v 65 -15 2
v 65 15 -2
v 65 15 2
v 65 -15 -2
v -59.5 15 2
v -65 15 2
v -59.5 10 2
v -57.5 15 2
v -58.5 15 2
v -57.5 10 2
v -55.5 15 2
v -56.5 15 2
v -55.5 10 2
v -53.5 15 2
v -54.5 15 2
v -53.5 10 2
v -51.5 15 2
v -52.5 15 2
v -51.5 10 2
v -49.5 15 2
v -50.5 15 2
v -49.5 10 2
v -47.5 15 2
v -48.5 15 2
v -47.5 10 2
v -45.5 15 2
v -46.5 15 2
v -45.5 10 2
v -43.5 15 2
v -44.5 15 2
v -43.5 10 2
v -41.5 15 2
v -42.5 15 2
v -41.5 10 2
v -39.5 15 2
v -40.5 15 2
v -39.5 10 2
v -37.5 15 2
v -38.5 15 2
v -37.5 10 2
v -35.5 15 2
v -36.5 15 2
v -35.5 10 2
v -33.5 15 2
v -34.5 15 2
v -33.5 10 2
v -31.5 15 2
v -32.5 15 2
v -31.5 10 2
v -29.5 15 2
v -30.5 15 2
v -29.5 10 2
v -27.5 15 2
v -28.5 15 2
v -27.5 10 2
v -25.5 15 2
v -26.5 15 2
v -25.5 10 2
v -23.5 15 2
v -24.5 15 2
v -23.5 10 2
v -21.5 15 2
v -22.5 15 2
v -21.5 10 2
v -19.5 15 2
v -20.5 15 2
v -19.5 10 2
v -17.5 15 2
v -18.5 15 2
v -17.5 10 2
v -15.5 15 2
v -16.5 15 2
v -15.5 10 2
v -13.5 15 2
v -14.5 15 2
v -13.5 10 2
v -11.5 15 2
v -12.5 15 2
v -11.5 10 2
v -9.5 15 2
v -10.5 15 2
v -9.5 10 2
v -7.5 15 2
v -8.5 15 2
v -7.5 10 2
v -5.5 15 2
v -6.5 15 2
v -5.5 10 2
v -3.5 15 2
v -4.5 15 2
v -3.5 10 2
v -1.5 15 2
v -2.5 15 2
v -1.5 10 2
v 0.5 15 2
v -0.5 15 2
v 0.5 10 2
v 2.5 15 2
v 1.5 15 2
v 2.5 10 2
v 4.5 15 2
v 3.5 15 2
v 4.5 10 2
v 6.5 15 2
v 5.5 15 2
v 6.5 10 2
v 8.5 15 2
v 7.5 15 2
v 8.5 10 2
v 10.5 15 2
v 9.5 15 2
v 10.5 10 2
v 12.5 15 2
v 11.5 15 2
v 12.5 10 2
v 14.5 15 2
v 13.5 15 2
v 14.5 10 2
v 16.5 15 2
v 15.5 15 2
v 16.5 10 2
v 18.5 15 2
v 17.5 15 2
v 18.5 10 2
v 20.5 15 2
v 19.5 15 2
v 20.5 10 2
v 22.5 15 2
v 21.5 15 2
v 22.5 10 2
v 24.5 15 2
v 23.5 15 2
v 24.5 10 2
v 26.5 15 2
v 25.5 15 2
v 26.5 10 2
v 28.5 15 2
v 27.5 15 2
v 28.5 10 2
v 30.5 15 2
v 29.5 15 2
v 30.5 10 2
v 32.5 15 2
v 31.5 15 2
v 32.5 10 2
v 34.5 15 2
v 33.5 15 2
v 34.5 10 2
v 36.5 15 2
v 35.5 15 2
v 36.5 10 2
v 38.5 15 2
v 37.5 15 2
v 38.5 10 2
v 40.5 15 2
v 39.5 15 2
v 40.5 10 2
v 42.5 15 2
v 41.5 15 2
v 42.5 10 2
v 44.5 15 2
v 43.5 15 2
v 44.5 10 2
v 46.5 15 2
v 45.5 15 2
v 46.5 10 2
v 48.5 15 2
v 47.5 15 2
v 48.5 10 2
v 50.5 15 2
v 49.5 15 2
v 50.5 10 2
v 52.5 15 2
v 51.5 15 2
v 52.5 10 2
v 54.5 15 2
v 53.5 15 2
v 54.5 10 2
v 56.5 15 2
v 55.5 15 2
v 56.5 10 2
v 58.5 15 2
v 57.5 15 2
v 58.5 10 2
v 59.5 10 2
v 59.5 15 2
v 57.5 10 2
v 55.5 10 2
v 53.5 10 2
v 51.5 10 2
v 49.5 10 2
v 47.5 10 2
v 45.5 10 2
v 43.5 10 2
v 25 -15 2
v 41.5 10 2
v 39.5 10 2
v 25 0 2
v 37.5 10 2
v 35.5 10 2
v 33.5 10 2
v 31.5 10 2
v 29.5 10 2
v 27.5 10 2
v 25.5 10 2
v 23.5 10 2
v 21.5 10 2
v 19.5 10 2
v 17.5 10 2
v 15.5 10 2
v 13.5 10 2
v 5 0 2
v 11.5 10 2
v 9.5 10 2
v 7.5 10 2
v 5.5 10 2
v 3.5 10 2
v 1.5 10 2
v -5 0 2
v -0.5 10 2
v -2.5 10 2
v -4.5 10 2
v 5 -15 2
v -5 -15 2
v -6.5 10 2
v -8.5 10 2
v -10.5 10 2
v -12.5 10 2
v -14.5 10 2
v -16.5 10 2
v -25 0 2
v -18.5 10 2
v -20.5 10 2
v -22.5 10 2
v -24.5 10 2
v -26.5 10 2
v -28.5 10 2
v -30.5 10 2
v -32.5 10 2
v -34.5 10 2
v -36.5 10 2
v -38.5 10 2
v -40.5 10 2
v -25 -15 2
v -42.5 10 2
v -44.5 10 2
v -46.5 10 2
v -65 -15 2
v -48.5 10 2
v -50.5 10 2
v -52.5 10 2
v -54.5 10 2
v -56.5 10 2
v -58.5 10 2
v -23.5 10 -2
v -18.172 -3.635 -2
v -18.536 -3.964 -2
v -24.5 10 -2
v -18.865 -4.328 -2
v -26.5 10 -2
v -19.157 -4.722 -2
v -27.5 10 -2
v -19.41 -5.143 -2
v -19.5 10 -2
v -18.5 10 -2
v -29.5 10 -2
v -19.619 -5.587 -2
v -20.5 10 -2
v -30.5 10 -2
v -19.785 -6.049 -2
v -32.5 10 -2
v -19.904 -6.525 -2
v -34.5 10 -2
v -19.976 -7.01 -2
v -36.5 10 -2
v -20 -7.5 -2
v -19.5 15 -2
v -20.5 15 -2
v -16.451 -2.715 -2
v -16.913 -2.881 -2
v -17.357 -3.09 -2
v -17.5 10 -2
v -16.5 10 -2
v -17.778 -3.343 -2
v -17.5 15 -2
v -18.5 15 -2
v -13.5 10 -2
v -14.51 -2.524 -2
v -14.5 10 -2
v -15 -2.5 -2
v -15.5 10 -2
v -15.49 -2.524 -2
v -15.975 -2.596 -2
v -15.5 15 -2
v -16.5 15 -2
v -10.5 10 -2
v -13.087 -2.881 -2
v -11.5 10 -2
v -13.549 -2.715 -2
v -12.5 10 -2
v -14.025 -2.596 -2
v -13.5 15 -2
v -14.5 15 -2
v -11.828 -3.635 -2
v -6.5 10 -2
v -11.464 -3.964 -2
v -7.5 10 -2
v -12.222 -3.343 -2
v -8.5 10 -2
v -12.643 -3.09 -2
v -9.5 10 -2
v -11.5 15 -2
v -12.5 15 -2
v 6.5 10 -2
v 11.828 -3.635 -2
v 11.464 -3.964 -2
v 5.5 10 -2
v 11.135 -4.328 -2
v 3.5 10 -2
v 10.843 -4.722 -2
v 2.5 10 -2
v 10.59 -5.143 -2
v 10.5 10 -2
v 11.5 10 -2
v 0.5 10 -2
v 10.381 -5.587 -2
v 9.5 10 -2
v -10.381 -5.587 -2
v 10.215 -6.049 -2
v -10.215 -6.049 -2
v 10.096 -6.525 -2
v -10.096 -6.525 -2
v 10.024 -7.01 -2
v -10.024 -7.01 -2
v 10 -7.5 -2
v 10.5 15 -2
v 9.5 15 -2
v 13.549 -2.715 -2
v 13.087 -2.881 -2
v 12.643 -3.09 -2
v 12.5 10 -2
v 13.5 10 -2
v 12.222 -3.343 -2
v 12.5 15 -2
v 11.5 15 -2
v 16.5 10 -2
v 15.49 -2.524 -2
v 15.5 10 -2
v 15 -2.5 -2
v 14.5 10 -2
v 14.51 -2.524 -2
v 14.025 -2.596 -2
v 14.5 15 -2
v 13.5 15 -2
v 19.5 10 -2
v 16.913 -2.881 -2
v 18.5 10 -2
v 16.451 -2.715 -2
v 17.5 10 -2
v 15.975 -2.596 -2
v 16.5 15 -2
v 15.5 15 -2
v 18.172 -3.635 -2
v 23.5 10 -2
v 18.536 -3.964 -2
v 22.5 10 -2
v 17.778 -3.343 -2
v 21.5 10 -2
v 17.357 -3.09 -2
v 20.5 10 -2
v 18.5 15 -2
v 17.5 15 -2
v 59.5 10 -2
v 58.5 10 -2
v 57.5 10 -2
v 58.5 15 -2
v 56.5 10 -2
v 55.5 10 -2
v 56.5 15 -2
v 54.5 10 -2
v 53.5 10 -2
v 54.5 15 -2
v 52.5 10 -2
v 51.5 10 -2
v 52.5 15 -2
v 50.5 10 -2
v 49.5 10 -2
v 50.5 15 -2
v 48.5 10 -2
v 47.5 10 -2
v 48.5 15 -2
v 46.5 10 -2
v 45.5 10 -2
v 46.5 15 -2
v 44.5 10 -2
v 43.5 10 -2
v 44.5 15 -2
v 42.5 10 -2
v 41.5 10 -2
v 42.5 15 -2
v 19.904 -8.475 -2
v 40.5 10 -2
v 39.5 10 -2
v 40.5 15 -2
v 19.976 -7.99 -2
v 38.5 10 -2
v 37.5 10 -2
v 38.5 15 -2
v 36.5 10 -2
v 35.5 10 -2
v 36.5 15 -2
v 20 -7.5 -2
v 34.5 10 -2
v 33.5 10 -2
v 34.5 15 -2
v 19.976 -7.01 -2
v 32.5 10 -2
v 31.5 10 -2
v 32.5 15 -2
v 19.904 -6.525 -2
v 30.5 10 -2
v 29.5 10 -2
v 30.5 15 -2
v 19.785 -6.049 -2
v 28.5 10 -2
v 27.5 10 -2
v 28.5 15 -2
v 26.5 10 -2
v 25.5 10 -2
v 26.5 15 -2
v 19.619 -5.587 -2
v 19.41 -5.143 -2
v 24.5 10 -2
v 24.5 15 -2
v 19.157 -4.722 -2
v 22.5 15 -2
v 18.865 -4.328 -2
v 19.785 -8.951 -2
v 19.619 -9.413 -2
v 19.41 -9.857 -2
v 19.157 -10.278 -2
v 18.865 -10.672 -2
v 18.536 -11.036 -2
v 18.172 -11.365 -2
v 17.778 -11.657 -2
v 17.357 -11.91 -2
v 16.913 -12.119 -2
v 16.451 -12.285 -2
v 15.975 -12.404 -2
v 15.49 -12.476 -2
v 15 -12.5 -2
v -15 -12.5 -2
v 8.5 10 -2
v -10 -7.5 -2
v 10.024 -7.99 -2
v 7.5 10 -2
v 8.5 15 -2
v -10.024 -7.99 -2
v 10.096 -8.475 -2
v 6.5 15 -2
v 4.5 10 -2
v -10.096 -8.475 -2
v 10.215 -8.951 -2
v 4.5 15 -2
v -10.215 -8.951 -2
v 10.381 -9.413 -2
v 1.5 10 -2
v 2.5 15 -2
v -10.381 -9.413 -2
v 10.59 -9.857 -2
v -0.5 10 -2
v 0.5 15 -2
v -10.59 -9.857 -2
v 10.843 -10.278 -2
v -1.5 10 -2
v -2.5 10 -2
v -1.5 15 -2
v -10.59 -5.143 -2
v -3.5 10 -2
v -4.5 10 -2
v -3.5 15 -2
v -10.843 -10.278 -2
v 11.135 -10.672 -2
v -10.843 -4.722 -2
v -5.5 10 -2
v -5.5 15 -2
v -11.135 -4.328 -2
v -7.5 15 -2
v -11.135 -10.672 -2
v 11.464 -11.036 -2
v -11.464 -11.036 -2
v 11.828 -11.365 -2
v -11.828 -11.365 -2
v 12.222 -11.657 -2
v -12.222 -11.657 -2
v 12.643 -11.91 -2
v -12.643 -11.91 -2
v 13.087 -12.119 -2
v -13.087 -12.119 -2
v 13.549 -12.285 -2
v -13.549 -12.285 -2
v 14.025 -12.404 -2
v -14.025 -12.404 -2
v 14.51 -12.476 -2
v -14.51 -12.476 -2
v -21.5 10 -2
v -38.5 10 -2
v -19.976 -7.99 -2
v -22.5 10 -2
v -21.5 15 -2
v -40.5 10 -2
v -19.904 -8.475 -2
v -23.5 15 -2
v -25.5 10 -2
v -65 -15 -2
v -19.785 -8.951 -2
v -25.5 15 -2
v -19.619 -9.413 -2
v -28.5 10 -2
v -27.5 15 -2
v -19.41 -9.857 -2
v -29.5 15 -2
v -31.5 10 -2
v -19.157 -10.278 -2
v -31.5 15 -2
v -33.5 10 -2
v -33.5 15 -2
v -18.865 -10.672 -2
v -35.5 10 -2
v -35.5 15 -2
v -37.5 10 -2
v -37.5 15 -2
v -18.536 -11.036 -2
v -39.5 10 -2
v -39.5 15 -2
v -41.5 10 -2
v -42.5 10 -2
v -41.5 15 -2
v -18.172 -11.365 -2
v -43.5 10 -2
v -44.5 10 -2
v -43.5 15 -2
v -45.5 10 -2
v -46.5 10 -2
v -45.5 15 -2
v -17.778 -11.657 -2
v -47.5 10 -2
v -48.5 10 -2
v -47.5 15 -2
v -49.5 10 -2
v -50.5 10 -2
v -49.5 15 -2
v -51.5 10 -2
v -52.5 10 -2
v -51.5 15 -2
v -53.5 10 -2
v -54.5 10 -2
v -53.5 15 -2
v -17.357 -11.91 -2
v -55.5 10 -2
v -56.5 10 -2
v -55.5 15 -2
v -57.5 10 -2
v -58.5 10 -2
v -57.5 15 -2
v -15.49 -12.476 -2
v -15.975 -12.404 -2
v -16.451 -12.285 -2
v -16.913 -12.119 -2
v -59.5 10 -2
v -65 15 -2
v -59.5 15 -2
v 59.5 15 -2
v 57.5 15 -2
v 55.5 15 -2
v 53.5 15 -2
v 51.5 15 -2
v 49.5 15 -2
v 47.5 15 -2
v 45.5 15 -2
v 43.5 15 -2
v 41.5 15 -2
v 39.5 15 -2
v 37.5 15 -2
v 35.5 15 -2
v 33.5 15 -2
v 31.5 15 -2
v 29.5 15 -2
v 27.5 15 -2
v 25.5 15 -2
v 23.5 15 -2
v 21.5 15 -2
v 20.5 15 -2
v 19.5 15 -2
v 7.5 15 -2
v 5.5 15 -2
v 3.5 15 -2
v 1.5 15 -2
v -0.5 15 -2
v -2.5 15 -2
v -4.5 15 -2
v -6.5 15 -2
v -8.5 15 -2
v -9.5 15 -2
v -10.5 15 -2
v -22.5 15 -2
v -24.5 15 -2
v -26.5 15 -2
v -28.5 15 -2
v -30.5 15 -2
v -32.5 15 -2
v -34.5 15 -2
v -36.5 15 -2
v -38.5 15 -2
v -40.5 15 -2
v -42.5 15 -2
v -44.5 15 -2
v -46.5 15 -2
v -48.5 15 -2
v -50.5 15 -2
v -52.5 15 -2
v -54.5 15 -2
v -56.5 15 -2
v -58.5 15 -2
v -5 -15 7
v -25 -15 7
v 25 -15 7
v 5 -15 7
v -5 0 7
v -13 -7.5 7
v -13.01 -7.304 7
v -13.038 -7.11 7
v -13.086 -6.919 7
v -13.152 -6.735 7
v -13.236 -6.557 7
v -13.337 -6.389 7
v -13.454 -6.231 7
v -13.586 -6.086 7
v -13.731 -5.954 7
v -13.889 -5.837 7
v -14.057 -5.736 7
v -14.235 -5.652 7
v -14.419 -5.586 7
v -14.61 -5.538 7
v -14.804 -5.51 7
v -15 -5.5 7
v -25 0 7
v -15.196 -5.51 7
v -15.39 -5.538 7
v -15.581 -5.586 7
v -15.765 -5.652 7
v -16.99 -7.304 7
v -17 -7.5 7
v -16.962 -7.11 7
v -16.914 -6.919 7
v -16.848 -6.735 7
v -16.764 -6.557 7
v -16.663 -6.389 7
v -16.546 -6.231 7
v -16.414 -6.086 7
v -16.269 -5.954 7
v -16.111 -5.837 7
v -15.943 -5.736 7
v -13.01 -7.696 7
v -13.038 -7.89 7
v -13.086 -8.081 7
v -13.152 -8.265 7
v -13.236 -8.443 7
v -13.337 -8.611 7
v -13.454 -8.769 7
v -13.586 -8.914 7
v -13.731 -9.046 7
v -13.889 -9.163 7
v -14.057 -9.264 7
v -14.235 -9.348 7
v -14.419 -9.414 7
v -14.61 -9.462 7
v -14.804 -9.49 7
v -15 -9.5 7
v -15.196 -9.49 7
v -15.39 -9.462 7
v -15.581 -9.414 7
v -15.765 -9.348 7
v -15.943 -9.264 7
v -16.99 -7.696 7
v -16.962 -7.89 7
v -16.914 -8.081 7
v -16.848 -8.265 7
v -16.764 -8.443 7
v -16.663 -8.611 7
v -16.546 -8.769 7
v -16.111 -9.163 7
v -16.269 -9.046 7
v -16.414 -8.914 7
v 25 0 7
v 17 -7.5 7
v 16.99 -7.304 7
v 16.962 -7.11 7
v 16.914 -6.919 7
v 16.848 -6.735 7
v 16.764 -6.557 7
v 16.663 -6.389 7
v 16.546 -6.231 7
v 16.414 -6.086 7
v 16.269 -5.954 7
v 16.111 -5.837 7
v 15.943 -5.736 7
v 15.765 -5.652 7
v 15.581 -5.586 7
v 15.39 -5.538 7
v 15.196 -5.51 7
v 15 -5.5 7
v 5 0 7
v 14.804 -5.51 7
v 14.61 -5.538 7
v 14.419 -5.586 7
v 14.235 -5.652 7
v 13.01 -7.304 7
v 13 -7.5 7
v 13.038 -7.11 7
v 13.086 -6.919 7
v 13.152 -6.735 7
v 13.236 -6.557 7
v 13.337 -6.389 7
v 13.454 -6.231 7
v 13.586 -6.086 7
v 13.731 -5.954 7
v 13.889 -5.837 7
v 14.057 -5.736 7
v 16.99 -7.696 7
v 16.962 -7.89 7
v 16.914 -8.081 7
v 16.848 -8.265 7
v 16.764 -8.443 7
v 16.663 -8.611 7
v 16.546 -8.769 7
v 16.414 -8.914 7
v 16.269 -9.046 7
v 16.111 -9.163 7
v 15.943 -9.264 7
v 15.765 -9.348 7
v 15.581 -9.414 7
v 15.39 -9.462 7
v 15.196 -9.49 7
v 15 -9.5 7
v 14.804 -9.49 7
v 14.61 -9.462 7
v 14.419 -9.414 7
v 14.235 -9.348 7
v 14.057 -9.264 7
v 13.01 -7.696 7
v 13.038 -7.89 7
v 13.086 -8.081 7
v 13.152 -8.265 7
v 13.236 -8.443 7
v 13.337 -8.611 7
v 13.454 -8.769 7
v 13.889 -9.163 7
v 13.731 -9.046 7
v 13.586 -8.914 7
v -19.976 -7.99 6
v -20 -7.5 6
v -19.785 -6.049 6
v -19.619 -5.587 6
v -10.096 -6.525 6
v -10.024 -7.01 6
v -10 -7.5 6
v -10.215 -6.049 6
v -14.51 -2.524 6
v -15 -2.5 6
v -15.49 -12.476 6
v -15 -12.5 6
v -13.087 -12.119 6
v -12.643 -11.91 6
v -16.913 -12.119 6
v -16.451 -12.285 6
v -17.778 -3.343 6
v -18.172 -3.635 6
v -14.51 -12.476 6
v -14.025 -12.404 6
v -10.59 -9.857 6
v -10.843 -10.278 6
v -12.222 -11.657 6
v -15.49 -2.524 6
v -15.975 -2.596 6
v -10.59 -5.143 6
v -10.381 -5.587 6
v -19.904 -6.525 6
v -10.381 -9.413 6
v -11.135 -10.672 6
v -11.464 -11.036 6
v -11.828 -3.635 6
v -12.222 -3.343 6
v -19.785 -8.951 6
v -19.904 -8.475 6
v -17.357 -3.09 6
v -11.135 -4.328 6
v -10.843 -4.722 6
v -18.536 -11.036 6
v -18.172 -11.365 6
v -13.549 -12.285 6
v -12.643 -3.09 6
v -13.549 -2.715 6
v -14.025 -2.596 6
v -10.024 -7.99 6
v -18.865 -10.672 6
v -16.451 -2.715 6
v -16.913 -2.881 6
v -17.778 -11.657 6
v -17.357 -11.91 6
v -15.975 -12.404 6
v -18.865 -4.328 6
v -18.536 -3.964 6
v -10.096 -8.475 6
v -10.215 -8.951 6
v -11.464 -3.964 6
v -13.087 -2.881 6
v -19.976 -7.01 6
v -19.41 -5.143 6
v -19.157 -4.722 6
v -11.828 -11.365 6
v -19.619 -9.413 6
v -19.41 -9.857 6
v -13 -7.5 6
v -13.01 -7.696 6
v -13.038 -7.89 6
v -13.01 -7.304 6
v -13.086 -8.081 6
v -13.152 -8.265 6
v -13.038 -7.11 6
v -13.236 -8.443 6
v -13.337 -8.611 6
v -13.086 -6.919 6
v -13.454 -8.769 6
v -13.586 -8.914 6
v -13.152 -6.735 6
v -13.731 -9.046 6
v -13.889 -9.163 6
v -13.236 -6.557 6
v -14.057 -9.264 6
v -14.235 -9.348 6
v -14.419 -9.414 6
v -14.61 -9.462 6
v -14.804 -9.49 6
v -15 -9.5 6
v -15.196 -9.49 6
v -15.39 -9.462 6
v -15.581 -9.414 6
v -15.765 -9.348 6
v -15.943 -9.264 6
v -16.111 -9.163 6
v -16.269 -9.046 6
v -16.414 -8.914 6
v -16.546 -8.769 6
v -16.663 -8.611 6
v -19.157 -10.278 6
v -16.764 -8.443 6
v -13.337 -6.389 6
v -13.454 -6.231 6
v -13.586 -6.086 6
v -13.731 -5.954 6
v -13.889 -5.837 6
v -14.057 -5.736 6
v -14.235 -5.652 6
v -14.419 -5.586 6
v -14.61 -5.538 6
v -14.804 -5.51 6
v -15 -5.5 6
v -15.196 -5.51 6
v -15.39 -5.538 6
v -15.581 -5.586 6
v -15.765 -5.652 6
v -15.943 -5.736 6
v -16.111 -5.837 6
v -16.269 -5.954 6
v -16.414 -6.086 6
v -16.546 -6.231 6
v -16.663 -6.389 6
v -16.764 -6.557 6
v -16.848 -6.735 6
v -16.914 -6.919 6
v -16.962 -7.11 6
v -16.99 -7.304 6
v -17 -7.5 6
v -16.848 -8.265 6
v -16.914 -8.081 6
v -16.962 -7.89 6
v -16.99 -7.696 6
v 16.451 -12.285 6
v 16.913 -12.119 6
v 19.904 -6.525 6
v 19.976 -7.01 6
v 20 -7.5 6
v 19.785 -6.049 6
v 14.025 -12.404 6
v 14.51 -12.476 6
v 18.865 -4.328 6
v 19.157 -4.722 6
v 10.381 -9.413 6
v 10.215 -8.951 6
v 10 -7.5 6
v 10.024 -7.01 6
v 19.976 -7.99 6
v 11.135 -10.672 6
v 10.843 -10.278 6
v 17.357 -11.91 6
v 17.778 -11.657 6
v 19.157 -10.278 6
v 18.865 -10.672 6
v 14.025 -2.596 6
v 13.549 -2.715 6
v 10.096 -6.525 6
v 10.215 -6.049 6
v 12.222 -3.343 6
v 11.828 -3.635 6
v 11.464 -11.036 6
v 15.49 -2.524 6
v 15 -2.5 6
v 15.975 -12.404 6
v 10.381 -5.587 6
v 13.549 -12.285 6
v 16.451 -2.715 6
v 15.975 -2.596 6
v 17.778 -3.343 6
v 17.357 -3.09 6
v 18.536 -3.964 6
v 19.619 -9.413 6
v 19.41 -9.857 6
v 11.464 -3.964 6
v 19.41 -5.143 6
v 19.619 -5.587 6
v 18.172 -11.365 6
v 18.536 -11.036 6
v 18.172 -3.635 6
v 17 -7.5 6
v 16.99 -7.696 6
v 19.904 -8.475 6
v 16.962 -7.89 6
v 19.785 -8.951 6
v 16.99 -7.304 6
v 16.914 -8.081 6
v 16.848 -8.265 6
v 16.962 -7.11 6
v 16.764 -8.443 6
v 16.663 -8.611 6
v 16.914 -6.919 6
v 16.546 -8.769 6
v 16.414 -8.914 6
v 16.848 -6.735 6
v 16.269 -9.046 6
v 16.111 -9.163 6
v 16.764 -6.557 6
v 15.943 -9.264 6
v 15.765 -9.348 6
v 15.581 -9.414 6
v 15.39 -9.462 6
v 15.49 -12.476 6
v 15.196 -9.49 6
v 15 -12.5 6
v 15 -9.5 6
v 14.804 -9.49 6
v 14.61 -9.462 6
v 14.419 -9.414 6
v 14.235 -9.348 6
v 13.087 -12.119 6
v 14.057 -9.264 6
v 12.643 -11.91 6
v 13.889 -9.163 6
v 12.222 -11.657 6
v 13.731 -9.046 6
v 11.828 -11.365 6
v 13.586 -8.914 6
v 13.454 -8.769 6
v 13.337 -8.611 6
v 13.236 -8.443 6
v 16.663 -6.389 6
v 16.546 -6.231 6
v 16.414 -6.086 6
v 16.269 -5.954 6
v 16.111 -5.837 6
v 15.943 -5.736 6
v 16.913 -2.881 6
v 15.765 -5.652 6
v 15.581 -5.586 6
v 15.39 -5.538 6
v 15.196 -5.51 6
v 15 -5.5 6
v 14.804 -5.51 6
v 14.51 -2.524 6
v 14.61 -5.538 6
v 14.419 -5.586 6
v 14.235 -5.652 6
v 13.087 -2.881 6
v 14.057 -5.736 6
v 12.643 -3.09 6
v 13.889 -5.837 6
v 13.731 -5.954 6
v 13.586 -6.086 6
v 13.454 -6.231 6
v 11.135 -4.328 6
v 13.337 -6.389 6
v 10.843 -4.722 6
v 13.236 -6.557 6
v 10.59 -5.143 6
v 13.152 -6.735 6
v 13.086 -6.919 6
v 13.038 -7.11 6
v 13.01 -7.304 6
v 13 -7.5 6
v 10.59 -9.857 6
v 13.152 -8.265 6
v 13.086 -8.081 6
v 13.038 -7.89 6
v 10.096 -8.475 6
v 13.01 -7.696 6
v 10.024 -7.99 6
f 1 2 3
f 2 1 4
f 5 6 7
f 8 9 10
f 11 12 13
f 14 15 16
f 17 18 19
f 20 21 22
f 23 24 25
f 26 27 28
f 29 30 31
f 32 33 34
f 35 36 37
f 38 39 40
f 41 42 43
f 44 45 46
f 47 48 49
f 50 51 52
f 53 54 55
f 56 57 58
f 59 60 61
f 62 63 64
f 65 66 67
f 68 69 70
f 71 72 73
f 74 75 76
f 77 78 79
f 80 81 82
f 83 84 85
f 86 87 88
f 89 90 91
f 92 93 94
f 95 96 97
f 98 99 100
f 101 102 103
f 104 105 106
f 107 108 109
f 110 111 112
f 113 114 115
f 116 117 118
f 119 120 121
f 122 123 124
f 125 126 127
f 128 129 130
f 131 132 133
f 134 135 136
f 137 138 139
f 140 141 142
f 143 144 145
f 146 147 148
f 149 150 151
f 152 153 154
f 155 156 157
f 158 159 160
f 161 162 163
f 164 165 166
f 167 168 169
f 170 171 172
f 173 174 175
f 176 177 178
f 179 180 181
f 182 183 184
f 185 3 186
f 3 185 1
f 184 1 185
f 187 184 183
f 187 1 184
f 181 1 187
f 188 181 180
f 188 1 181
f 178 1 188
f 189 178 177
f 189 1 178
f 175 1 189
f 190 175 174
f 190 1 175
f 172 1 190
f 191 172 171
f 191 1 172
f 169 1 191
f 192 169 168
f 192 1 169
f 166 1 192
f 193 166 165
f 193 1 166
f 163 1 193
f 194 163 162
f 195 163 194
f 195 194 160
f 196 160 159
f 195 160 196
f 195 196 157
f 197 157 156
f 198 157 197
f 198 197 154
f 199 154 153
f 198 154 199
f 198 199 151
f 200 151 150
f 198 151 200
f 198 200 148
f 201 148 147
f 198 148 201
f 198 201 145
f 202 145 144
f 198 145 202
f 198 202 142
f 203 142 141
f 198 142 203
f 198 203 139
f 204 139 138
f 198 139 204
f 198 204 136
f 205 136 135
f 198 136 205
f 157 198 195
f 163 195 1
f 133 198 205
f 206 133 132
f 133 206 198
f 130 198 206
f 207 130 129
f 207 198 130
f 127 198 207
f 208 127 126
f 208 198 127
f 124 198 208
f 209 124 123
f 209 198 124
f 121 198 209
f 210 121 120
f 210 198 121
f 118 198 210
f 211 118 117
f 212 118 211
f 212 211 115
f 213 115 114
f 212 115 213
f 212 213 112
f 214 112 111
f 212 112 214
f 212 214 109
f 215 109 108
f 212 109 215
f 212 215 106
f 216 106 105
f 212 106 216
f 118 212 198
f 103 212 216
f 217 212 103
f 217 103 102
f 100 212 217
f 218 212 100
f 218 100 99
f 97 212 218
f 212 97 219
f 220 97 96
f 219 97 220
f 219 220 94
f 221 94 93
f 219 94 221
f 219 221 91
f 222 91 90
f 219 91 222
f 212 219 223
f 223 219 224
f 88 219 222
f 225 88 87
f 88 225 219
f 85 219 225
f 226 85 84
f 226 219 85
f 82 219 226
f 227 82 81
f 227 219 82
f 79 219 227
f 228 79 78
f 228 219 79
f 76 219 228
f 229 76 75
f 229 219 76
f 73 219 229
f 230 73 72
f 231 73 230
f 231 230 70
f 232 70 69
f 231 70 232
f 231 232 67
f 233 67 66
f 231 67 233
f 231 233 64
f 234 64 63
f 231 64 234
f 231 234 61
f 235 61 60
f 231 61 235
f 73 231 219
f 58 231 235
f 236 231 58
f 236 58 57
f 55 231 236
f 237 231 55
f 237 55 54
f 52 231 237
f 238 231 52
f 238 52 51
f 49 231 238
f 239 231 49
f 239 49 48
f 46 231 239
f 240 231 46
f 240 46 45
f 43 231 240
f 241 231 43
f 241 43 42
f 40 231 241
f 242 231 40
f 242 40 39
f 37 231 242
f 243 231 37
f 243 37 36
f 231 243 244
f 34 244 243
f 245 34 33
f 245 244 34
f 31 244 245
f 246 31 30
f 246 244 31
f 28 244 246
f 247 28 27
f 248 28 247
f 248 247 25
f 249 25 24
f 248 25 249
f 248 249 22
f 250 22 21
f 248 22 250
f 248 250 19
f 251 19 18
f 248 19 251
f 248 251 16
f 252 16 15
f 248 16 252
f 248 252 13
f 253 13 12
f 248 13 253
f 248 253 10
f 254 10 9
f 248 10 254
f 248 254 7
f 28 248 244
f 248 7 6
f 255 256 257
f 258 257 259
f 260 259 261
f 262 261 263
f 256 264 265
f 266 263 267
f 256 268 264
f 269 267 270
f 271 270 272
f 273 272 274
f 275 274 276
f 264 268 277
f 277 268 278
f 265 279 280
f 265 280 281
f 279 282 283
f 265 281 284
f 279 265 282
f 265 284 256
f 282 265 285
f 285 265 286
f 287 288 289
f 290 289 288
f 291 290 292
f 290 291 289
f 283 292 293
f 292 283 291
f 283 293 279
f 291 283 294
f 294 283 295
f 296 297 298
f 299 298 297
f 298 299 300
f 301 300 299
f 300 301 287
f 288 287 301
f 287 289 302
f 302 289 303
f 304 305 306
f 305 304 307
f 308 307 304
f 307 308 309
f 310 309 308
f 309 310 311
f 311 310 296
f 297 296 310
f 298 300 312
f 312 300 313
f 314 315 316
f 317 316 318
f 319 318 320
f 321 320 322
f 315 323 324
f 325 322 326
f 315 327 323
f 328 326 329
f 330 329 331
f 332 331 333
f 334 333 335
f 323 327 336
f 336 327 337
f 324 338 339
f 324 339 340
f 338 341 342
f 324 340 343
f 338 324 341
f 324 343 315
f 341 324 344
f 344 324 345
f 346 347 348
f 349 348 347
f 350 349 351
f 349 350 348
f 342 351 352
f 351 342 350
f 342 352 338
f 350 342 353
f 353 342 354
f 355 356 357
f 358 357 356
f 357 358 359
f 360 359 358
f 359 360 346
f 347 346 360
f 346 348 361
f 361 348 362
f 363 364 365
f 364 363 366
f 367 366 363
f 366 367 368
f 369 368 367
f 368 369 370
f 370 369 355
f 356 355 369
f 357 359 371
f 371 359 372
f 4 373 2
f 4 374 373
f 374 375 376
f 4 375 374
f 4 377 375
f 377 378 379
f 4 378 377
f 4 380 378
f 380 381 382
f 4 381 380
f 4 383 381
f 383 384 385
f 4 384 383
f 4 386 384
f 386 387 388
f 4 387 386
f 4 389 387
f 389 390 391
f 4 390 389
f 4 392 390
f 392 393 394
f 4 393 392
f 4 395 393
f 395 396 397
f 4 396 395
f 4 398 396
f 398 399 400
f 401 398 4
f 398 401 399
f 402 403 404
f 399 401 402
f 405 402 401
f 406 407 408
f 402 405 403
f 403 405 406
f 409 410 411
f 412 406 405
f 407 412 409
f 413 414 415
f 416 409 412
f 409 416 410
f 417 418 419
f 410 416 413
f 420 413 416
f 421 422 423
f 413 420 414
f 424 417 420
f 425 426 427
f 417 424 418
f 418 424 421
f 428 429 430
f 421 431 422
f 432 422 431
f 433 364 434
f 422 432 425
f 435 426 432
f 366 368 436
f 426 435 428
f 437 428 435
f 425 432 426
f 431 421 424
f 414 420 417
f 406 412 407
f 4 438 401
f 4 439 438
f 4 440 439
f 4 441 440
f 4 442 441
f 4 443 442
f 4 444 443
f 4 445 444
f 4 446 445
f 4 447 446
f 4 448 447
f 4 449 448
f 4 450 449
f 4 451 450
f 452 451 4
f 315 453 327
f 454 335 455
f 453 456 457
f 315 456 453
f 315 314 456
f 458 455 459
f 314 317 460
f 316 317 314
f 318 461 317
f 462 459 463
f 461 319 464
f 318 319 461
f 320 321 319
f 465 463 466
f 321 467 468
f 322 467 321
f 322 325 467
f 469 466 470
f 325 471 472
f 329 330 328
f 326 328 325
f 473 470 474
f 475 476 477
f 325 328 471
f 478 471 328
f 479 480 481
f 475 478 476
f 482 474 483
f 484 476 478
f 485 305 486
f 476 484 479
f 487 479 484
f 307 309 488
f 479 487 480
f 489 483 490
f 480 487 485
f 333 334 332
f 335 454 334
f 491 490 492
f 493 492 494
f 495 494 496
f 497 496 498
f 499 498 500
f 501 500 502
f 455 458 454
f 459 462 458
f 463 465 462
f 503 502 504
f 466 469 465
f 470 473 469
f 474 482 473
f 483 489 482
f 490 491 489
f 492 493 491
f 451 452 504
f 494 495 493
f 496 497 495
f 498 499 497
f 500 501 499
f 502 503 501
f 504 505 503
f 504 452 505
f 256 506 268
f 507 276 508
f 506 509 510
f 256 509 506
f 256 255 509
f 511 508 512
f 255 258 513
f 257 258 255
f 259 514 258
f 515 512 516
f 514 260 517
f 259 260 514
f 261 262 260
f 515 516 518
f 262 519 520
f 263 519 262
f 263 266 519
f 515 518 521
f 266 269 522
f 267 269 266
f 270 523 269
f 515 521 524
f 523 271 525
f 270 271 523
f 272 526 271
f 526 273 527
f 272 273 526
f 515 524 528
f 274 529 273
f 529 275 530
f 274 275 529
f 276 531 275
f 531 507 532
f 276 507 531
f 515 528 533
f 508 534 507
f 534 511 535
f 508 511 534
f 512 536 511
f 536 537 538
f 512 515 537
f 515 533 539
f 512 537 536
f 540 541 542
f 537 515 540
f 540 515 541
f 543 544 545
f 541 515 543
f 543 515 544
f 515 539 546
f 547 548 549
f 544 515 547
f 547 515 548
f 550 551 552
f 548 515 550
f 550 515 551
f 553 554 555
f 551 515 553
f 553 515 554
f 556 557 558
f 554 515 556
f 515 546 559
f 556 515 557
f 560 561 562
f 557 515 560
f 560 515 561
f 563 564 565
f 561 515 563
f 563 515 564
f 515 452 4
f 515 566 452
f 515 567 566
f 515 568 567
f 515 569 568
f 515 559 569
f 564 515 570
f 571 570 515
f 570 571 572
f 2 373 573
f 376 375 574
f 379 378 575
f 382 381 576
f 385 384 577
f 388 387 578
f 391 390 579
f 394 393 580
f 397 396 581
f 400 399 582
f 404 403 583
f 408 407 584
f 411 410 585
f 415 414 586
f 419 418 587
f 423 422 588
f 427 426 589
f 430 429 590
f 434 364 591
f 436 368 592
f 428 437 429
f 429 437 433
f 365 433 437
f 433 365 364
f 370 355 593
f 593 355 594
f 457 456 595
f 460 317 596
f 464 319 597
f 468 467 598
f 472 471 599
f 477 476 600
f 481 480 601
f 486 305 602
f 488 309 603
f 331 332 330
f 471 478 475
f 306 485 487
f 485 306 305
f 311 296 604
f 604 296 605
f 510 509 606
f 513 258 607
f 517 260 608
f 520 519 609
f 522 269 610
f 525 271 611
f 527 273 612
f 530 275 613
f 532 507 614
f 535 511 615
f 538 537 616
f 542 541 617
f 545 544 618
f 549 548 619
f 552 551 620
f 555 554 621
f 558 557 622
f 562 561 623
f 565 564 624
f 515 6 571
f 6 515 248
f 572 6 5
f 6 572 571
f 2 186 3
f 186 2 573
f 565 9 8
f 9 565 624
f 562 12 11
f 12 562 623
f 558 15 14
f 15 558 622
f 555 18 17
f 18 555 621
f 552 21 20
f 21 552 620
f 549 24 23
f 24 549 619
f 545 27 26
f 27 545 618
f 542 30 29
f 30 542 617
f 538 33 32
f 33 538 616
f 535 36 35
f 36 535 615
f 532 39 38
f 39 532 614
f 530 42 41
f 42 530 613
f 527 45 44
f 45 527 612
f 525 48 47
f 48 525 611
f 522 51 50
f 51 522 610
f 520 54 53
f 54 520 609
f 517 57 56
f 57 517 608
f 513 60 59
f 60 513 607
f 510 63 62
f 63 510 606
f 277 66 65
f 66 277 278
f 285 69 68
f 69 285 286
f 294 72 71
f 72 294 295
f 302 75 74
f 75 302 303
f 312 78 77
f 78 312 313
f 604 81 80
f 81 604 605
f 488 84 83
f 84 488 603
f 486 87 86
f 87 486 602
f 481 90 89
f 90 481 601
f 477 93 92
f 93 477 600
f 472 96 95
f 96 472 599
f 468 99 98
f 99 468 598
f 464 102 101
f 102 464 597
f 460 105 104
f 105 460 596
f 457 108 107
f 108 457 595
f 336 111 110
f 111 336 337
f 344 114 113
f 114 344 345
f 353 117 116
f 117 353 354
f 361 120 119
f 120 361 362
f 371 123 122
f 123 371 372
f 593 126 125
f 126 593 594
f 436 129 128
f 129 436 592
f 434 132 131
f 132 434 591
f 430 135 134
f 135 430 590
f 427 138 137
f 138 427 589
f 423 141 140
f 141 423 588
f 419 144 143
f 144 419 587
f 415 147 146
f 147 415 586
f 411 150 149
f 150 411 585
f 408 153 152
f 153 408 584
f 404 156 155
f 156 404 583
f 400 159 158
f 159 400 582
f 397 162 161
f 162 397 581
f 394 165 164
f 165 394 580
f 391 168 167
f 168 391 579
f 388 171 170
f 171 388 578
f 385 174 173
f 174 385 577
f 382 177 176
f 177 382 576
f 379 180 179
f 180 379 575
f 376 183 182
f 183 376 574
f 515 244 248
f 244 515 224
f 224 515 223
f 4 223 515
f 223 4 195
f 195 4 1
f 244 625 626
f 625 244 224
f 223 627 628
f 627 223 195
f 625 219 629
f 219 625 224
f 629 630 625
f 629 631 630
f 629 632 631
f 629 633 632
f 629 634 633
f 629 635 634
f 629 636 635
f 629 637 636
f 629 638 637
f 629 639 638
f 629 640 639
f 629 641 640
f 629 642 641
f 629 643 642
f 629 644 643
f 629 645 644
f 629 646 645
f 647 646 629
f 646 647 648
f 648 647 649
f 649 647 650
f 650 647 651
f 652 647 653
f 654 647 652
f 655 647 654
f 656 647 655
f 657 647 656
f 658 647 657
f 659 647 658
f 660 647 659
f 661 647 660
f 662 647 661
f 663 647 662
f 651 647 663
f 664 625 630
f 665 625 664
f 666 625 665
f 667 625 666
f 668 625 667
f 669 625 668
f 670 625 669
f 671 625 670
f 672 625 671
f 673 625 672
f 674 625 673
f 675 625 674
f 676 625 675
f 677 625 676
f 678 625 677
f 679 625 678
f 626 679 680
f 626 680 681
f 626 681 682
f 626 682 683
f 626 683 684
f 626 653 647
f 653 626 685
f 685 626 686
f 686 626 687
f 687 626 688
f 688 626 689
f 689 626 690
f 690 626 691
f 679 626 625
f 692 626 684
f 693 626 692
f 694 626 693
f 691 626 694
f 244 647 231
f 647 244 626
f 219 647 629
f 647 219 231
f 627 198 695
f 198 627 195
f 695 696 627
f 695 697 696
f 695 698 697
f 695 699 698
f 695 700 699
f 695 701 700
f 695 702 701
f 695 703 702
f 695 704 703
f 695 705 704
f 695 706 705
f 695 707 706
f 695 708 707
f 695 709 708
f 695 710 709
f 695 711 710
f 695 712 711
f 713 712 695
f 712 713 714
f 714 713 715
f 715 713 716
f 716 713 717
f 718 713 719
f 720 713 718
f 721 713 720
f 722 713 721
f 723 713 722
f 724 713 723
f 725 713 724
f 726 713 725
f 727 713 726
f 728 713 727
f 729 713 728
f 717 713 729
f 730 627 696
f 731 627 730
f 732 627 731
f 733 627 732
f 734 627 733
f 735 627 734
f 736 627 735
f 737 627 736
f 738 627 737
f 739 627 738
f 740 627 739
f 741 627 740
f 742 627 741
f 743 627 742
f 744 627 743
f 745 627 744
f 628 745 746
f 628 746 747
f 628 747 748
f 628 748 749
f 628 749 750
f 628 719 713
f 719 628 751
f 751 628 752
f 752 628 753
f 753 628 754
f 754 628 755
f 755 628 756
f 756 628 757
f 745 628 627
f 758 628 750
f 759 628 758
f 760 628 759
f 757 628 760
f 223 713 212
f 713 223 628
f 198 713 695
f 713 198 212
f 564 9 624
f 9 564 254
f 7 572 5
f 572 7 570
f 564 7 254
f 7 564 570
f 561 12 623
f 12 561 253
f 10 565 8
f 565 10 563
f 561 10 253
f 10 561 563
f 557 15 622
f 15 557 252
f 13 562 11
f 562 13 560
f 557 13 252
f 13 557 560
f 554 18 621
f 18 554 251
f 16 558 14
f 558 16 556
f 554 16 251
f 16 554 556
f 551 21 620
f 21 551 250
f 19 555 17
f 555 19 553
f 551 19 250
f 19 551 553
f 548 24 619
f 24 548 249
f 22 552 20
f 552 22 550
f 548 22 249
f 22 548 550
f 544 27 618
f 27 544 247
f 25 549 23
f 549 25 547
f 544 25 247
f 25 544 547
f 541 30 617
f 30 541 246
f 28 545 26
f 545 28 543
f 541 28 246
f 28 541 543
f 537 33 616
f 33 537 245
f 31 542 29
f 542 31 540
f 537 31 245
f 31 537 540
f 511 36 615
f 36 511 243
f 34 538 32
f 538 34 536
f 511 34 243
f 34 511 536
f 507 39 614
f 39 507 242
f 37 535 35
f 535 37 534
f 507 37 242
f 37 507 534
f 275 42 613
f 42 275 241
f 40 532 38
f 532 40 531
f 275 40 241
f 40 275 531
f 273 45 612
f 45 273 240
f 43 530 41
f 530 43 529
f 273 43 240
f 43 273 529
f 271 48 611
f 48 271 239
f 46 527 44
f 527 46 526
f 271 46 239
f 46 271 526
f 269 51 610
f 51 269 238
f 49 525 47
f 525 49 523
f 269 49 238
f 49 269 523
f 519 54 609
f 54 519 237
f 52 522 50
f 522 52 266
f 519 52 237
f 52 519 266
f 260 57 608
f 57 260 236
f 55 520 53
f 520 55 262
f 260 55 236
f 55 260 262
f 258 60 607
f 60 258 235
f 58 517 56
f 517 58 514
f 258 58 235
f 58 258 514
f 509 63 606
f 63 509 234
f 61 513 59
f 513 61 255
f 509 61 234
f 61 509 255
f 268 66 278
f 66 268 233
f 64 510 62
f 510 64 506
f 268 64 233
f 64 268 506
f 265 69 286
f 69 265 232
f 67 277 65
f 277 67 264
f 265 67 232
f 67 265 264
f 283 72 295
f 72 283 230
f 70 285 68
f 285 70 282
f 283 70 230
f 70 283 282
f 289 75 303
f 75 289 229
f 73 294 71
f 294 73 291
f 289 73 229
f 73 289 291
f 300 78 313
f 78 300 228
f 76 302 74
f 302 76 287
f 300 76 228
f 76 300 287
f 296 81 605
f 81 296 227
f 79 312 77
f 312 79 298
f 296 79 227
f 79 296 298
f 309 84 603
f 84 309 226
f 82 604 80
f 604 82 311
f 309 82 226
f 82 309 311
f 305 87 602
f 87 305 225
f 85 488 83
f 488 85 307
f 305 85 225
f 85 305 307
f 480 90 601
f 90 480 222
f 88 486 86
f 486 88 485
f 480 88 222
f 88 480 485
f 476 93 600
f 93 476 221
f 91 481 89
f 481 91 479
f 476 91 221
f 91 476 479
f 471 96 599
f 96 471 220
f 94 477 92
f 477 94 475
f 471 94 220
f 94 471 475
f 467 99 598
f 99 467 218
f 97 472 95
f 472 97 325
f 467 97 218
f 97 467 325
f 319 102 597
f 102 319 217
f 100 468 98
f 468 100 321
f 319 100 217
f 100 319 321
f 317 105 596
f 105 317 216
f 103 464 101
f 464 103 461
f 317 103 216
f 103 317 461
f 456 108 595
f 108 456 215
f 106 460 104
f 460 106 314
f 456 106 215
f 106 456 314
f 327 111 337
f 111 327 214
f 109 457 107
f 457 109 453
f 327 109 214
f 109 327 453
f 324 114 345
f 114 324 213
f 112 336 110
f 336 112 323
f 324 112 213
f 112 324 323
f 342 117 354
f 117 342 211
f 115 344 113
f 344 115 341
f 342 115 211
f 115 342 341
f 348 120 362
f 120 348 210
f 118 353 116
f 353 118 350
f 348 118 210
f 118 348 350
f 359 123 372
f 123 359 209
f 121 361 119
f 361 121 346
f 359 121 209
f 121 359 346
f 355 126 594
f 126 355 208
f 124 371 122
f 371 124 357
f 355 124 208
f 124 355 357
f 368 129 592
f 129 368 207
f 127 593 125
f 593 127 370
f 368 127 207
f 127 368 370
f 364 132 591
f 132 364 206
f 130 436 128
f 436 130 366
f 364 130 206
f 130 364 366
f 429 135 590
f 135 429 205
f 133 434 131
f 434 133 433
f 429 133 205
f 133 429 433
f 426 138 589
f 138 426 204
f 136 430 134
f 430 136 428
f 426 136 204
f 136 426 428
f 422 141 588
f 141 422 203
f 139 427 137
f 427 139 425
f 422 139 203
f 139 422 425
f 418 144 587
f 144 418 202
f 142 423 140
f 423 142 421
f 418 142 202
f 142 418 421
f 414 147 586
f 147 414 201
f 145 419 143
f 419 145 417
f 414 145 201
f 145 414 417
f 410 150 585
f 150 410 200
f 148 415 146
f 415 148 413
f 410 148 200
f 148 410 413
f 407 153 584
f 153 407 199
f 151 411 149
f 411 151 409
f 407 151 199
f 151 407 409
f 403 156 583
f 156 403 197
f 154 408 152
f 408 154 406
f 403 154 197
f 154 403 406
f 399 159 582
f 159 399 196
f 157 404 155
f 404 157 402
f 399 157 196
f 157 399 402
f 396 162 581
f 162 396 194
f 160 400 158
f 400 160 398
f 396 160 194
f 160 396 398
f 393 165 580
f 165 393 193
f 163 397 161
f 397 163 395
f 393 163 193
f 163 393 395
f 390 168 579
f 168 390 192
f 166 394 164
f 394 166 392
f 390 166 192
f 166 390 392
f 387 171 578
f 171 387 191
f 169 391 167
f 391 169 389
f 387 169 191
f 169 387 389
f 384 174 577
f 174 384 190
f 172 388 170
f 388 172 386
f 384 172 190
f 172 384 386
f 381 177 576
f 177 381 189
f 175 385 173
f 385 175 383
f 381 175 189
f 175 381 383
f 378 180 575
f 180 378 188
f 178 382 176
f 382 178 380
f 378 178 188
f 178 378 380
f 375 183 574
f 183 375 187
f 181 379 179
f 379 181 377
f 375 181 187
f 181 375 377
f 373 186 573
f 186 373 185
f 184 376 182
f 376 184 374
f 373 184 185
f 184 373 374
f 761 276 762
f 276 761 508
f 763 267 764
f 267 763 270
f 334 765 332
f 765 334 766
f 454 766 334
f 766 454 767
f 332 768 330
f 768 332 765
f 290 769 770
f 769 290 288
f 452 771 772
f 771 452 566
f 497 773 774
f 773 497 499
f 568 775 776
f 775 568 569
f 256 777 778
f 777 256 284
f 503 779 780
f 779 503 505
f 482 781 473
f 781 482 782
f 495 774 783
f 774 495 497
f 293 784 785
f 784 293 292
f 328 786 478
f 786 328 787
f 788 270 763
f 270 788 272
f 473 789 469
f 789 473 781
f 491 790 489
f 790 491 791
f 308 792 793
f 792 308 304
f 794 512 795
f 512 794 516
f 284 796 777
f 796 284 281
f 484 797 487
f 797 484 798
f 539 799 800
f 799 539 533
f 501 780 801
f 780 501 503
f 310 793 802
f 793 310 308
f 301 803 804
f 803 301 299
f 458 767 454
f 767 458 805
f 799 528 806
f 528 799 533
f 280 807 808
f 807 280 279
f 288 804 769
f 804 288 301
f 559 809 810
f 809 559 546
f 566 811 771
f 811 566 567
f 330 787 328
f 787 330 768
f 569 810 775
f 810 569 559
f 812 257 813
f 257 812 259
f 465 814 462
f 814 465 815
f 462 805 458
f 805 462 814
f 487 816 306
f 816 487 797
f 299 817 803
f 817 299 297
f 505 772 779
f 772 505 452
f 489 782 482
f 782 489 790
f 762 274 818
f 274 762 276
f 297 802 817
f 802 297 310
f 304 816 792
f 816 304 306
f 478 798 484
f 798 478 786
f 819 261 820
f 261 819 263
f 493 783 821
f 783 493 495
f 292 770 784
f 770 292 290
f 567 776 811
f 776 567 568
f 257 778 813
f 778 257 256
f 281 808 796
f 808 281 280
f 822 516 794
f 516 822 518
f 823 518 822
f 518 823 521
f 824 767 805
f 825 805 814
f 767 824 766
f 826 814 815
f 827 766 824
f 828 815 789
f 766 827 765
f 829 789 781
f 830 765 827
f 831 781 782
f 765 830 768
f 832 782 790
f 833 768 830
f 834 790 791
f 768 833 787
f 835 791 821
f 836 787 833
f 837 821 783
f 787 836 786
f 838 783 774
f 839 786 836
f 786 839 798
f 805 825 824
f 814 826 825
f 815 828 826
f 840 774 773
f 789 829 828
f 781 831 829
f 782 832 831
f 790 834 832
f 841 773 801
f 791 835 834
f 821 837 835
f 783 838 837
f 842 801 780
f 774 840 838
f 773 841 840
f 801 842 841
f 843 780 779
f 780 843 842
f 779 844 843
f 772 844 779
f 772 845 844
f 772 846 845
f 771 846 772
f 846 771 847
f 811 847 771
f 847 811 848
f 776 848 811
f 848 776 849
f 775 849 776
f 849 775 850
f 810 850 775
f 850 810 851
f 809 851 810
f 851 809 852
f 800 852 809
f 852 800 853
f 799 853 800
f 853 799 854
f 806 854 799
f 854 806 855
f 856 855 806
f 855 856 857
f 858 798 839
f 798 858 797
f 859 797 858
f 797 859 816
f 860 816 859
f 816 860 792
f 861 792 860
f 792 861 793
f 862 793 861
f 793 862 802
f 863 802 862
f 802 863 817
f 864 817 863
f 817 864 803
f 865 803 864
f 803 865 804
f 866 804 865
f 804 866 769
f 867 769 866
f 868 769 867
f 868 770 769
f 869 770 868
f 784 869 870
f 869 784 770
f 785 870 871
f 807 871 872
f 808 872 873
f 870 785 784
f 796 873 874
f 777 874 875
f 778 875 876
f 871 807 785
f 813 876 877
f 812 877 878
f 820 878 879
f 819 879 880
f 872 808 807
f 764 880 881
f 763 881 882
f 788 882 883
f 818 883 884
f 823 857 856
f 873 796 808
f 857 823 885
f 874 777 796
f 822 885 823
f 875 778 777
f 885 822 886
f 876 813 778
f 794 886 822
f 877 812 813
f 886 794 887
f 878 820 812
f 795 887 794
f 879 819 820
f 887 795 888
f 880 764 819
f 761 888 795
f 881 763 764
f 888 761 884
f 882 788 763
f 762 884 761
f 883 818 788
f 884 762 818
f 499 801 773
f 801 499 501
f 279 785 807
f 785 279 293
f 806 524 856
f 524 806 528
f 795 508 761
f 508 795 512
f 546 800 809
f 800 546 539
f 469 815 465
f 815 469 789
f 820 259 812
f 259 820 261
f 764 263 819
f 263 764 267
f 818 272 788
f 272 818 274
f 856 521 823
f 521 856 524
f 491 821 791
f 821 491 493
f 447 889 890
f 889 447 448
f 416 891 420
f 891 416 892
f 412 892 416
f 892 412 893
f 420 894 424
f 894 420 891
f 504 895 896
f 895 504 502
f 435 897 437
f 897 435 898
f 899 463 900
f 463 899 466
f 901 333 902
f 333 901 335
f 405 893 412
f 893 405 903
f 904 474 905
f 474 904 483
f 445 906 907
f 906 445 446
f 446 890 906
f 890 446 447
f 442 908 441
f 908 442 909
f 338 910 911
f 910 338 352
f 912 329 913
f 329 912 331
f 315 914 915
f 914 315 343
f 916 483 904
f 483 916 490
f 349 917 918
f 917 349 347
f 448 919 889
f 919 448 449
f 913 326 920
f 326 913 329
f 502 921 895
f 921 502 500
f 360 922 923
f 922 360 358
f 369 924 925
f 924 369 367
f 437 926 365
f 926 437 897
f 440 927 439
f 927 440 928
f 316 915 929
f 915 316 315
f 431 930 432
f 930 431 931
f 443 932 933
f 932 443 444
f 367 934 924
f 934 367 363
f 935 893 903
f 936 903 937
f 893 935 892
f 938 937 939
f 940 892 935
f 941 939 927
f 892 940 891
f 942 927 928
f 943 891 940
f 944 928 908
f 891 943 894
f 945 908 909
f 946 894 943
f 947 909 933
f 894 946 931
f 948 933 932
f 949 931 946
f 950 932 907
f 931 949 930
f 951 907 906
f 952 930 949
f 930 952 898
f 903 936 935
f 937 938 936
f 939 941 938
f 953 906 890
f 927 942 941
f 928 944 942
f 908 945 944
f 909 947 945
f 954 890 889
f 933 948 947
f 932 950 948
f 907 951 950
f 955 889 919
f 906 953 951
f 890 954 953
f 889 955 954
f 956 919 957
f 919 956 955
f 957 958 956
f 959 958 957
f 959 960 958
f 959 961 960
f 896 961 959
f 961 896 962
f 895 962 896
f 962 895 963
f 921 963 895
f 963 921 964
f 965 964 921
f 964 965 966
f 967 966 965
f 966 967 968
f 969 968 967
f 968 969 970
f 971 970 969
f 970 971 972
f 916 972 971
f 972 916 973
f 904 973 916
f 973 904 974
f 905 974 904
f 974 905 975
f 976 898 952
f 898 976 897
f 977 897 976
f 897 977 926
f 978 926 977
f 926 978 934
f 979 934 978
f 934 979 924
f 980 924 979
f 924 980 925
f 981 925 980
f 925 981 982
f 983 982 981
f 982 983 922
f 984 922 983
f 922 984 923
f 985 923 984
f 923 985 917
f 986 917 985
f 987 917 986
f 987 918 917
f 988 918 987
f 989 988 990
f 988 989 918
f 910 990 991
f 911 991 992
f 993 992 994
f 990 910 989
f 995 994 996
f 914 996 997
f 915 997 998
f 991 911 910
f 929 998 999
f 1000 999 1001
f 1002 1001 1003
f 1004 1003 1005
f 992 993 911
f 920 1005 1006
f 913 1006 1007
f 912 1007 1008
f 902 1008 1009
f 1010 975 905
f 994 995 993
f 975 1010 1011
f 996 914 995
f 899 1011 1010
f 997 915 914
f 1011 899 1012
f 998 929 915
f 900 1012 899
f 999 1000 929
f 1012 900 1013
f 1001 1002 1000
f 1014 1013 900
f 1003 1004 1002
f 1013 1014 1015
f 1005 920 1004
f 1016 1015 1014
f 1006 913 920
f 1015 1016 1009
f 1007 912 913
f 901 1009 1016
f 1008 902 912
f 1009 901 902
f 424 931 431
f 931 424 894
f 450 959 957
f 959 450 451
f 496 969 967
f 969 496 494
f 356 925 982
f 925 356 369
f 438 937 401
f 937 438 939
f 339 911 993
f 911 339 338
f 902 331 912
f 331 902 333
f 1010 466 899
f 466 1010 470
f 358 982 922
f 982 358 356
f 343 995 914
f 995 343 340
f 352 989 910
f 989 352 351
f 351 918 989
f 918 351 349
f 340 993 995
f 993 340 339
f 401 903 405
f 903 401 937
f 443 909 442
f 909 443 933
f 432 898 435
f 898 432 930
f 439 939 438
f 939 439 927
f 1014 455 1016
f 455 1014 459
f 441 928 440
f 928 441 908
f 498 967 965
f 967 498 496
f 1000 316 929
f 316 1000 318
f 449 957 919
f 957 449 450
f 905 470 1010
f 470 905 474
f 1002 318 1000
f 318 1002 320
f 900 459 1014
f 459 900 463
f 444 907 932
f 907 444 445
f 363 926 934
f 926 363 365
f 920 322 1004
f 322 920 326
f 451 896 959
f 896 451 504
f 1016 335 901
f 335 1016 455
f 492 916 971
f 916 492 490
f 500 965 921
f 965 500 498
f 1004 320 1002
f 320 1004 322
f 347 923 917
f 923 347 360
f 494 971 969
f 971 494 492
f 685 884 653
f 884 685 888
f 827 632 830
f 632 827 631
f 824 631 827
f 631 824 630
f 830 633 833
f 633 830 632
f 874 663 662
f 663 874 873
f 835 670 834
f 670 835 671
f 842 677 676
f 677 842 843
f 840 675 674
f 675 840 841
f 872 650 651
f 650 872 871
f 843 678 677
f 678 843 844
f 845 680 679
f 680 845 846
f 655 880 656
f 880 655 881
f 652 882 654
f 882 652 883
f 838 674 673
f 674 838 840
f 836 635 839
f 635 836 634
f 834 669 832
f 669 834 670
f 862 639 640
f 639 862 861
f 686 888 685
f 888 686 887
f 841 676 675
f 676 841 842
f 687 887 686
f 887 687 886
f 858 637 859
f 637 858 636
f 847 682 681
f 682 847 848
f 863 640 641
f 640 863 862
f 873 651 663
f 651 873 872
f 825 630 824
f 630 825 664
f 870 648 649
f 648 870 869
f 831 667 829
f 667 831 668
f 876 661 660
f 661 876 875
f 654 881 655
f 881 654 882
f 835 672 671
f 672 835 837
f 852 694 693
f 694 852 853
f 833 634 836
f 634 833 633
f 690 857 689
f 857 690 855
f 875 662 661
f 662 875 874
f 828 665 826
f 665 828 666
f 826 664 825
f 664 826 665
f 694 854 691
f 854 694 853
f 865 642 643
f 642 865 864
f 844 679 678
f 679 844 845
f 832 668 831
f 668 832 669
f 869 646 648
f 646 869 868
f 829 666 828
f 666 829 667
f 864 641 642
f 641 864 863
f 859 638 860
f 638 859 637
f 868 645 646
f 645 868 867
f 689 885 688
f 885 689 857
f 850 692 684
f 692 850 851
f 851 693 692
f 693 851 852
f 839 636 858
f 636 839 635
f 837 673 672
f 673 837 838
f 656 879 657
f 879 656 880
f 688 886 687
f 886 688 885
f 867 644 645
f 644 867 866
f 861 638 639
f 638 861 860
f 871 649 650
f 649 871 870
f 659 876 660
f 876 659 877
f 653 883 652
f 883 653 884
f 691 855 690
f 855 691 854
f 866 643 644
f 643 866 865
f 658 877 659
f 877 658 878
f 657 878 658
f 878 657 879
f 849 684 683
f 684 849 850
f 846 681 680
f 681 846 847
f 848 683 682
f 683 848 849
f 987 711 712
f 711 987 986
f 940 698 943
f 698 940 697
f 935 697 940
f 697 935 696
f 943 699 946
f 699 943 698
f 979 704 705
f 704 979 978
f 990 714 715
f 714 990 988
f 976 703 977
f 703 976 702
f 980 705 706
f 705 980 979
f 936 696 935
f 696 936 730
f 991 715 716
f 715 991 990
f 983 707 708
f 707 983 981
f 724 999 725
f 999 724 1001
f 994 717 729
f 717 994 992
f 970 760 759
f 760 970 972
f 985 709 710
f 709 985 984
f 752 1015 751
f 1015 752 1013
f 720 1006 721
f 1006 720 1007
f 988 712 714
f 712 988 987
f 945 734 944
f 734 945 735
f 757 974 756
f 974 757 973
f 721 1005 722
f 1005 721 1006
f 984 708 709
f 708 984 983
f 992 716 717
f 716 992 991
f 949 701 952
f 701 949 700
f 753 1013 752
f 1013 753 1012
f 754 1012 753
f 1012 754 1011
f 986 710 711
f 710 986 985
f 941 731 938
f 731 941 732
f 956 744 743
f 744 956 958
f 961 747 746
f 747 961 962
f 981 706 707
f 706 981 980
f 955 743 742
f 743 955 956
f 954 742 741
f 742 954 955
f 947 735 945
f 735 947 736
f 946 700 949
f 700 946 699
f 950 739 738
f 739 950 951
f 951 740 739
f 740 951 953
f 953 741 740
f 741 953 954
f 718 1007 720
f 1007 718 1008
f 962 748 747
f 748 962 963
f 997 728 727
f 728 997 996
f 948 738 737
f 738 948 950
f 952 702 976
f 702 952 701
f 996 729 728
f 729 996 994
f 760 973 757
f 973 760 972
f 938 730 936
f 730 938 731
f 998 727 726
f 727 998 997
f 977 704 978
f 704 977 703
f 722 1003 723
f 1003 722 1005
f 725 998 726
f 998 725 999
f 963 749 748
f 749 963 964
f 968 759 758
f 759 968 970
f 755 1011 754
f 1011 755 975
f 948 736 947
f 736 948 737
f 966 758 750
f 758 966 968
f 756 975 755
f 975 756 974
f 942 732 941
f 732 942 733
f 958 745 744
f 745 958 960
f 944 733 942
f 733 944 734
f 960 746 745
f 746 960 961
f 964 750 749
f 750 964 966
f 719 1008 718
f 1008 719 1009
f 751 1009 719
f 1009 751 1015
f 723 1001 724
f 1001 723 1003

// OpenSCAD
$fn = 64;

mm = 1;
cm = 10*mm;

FRAME_STOCK_SIZE = 15*mm;
HEDDLE_COUNT = 60;
WARP_SEPARATION = 1*mm;
WARP_BLOCK_WIDTH = 13*cm;
WARP_BLOCK_HEIGHT = 3*cm;
WARP_BLOCK_THICKNESS = 4*mm;
WARP_HOOK_HEIGHT = 5*mm;
MOUNT_THICKNESS = 5*mm;

difference() {
  union() {
    cube
      ( [ WARP_BLOCK_WIDTH
        , WARP_BLOCK_HEIGHT
        , WARP_BLOCK_THICKNESS
        ]
      , center = true
      );

    // mounting
    translate
      ( [ -15*mm
        , -0.5*WARP_BLOCK_HEIGHT + 0.5*FRAME_STOCK_SIZE
        , 0.5*WARP_BLOCK_THICKNESS+0.5*MOUNT_THICKNESS
        ]
      )
    cube
      ( [ 2*cm
        , FRAME_STOCK_SIZE
        , MOUNT_THICKNESS
        ]
      , center = true
      );
    
    translate
      ( [ 15*mm
        , -0.5*WARP_BLOCK_HEIGHT + 0.5*FRAME_STOCK_SIZE
        , 0.5*WARP_BLOCK_THICKNESS+0.5*MOUNT_THICKNESS
        ]
      )
    cube
      ( [ 2*cm
        , FRAME_STOCK_SIZE
        , MOUNT_THICKNESS
        ]
      , center = true
      );
  }

  // teeth
  for (i = [0:HEDDLE_COUNT-1]) {
    translate
      ( [ -(HEDDLE_COUNT - 1)*WARP_SEPARATION + i*2*WARP_SEPARATION
        , 0.5*WARP_BLOCK_HEIGHT+5*mm-WARP_HOOK_HEIGHT
        , 0
        ]
      )
    cube([WARP_SEPARATION,1*cm,1*cm], center = true);
  }

  // mounting screw inset
  translate
    ( [ -15*mm
      , -0.5*WARP_BLOCK_HEIGHT + 0.5*FRAME_STOCK_SIZE
      , -2*cm + 0.5*WARP_BLOCK_THICKNESS + MOUNT_THICKNESS - 1*mm
      ]
    )
  cylinder
    ( d = 1*cm
    , h = 4*cm
    , center = true
    );
  
  translate
    ( [ 15*mm
      , -0.5*WARP_BLOCK_HEIGHT + 0.5*FRAME_STOCK_SIZE
      , -2*cm + 0.5*WARP_BLOCK_THICKNESS + MOUNT_THICKNESS - 1*mm
      ]
    )
  cylinder
    ( d = 1*cm
    , h = 4*cm
    , center = true
    );

  
  // mounting screw hole
  translate
    ( [ -15*mm
      , -0.5*WARP_BLOCK_HEIGHT + 0.5*FRAME_STOCK_SIZE
      , 0
      ]
    )
  cylinder
    ( d = 4*mm
    , h = 4*cm
    , center = true
    );
  
  translate
    ( [ 15*mm
      , -0.5*WARP_BLOCK_HEIGHT + 0.5*FRAME_STOCK_SIZE
      , 0
      ]
    )
  cylinder
    ( d = 4*mm
    , h = 4*cm
    , center = true
    );
}
